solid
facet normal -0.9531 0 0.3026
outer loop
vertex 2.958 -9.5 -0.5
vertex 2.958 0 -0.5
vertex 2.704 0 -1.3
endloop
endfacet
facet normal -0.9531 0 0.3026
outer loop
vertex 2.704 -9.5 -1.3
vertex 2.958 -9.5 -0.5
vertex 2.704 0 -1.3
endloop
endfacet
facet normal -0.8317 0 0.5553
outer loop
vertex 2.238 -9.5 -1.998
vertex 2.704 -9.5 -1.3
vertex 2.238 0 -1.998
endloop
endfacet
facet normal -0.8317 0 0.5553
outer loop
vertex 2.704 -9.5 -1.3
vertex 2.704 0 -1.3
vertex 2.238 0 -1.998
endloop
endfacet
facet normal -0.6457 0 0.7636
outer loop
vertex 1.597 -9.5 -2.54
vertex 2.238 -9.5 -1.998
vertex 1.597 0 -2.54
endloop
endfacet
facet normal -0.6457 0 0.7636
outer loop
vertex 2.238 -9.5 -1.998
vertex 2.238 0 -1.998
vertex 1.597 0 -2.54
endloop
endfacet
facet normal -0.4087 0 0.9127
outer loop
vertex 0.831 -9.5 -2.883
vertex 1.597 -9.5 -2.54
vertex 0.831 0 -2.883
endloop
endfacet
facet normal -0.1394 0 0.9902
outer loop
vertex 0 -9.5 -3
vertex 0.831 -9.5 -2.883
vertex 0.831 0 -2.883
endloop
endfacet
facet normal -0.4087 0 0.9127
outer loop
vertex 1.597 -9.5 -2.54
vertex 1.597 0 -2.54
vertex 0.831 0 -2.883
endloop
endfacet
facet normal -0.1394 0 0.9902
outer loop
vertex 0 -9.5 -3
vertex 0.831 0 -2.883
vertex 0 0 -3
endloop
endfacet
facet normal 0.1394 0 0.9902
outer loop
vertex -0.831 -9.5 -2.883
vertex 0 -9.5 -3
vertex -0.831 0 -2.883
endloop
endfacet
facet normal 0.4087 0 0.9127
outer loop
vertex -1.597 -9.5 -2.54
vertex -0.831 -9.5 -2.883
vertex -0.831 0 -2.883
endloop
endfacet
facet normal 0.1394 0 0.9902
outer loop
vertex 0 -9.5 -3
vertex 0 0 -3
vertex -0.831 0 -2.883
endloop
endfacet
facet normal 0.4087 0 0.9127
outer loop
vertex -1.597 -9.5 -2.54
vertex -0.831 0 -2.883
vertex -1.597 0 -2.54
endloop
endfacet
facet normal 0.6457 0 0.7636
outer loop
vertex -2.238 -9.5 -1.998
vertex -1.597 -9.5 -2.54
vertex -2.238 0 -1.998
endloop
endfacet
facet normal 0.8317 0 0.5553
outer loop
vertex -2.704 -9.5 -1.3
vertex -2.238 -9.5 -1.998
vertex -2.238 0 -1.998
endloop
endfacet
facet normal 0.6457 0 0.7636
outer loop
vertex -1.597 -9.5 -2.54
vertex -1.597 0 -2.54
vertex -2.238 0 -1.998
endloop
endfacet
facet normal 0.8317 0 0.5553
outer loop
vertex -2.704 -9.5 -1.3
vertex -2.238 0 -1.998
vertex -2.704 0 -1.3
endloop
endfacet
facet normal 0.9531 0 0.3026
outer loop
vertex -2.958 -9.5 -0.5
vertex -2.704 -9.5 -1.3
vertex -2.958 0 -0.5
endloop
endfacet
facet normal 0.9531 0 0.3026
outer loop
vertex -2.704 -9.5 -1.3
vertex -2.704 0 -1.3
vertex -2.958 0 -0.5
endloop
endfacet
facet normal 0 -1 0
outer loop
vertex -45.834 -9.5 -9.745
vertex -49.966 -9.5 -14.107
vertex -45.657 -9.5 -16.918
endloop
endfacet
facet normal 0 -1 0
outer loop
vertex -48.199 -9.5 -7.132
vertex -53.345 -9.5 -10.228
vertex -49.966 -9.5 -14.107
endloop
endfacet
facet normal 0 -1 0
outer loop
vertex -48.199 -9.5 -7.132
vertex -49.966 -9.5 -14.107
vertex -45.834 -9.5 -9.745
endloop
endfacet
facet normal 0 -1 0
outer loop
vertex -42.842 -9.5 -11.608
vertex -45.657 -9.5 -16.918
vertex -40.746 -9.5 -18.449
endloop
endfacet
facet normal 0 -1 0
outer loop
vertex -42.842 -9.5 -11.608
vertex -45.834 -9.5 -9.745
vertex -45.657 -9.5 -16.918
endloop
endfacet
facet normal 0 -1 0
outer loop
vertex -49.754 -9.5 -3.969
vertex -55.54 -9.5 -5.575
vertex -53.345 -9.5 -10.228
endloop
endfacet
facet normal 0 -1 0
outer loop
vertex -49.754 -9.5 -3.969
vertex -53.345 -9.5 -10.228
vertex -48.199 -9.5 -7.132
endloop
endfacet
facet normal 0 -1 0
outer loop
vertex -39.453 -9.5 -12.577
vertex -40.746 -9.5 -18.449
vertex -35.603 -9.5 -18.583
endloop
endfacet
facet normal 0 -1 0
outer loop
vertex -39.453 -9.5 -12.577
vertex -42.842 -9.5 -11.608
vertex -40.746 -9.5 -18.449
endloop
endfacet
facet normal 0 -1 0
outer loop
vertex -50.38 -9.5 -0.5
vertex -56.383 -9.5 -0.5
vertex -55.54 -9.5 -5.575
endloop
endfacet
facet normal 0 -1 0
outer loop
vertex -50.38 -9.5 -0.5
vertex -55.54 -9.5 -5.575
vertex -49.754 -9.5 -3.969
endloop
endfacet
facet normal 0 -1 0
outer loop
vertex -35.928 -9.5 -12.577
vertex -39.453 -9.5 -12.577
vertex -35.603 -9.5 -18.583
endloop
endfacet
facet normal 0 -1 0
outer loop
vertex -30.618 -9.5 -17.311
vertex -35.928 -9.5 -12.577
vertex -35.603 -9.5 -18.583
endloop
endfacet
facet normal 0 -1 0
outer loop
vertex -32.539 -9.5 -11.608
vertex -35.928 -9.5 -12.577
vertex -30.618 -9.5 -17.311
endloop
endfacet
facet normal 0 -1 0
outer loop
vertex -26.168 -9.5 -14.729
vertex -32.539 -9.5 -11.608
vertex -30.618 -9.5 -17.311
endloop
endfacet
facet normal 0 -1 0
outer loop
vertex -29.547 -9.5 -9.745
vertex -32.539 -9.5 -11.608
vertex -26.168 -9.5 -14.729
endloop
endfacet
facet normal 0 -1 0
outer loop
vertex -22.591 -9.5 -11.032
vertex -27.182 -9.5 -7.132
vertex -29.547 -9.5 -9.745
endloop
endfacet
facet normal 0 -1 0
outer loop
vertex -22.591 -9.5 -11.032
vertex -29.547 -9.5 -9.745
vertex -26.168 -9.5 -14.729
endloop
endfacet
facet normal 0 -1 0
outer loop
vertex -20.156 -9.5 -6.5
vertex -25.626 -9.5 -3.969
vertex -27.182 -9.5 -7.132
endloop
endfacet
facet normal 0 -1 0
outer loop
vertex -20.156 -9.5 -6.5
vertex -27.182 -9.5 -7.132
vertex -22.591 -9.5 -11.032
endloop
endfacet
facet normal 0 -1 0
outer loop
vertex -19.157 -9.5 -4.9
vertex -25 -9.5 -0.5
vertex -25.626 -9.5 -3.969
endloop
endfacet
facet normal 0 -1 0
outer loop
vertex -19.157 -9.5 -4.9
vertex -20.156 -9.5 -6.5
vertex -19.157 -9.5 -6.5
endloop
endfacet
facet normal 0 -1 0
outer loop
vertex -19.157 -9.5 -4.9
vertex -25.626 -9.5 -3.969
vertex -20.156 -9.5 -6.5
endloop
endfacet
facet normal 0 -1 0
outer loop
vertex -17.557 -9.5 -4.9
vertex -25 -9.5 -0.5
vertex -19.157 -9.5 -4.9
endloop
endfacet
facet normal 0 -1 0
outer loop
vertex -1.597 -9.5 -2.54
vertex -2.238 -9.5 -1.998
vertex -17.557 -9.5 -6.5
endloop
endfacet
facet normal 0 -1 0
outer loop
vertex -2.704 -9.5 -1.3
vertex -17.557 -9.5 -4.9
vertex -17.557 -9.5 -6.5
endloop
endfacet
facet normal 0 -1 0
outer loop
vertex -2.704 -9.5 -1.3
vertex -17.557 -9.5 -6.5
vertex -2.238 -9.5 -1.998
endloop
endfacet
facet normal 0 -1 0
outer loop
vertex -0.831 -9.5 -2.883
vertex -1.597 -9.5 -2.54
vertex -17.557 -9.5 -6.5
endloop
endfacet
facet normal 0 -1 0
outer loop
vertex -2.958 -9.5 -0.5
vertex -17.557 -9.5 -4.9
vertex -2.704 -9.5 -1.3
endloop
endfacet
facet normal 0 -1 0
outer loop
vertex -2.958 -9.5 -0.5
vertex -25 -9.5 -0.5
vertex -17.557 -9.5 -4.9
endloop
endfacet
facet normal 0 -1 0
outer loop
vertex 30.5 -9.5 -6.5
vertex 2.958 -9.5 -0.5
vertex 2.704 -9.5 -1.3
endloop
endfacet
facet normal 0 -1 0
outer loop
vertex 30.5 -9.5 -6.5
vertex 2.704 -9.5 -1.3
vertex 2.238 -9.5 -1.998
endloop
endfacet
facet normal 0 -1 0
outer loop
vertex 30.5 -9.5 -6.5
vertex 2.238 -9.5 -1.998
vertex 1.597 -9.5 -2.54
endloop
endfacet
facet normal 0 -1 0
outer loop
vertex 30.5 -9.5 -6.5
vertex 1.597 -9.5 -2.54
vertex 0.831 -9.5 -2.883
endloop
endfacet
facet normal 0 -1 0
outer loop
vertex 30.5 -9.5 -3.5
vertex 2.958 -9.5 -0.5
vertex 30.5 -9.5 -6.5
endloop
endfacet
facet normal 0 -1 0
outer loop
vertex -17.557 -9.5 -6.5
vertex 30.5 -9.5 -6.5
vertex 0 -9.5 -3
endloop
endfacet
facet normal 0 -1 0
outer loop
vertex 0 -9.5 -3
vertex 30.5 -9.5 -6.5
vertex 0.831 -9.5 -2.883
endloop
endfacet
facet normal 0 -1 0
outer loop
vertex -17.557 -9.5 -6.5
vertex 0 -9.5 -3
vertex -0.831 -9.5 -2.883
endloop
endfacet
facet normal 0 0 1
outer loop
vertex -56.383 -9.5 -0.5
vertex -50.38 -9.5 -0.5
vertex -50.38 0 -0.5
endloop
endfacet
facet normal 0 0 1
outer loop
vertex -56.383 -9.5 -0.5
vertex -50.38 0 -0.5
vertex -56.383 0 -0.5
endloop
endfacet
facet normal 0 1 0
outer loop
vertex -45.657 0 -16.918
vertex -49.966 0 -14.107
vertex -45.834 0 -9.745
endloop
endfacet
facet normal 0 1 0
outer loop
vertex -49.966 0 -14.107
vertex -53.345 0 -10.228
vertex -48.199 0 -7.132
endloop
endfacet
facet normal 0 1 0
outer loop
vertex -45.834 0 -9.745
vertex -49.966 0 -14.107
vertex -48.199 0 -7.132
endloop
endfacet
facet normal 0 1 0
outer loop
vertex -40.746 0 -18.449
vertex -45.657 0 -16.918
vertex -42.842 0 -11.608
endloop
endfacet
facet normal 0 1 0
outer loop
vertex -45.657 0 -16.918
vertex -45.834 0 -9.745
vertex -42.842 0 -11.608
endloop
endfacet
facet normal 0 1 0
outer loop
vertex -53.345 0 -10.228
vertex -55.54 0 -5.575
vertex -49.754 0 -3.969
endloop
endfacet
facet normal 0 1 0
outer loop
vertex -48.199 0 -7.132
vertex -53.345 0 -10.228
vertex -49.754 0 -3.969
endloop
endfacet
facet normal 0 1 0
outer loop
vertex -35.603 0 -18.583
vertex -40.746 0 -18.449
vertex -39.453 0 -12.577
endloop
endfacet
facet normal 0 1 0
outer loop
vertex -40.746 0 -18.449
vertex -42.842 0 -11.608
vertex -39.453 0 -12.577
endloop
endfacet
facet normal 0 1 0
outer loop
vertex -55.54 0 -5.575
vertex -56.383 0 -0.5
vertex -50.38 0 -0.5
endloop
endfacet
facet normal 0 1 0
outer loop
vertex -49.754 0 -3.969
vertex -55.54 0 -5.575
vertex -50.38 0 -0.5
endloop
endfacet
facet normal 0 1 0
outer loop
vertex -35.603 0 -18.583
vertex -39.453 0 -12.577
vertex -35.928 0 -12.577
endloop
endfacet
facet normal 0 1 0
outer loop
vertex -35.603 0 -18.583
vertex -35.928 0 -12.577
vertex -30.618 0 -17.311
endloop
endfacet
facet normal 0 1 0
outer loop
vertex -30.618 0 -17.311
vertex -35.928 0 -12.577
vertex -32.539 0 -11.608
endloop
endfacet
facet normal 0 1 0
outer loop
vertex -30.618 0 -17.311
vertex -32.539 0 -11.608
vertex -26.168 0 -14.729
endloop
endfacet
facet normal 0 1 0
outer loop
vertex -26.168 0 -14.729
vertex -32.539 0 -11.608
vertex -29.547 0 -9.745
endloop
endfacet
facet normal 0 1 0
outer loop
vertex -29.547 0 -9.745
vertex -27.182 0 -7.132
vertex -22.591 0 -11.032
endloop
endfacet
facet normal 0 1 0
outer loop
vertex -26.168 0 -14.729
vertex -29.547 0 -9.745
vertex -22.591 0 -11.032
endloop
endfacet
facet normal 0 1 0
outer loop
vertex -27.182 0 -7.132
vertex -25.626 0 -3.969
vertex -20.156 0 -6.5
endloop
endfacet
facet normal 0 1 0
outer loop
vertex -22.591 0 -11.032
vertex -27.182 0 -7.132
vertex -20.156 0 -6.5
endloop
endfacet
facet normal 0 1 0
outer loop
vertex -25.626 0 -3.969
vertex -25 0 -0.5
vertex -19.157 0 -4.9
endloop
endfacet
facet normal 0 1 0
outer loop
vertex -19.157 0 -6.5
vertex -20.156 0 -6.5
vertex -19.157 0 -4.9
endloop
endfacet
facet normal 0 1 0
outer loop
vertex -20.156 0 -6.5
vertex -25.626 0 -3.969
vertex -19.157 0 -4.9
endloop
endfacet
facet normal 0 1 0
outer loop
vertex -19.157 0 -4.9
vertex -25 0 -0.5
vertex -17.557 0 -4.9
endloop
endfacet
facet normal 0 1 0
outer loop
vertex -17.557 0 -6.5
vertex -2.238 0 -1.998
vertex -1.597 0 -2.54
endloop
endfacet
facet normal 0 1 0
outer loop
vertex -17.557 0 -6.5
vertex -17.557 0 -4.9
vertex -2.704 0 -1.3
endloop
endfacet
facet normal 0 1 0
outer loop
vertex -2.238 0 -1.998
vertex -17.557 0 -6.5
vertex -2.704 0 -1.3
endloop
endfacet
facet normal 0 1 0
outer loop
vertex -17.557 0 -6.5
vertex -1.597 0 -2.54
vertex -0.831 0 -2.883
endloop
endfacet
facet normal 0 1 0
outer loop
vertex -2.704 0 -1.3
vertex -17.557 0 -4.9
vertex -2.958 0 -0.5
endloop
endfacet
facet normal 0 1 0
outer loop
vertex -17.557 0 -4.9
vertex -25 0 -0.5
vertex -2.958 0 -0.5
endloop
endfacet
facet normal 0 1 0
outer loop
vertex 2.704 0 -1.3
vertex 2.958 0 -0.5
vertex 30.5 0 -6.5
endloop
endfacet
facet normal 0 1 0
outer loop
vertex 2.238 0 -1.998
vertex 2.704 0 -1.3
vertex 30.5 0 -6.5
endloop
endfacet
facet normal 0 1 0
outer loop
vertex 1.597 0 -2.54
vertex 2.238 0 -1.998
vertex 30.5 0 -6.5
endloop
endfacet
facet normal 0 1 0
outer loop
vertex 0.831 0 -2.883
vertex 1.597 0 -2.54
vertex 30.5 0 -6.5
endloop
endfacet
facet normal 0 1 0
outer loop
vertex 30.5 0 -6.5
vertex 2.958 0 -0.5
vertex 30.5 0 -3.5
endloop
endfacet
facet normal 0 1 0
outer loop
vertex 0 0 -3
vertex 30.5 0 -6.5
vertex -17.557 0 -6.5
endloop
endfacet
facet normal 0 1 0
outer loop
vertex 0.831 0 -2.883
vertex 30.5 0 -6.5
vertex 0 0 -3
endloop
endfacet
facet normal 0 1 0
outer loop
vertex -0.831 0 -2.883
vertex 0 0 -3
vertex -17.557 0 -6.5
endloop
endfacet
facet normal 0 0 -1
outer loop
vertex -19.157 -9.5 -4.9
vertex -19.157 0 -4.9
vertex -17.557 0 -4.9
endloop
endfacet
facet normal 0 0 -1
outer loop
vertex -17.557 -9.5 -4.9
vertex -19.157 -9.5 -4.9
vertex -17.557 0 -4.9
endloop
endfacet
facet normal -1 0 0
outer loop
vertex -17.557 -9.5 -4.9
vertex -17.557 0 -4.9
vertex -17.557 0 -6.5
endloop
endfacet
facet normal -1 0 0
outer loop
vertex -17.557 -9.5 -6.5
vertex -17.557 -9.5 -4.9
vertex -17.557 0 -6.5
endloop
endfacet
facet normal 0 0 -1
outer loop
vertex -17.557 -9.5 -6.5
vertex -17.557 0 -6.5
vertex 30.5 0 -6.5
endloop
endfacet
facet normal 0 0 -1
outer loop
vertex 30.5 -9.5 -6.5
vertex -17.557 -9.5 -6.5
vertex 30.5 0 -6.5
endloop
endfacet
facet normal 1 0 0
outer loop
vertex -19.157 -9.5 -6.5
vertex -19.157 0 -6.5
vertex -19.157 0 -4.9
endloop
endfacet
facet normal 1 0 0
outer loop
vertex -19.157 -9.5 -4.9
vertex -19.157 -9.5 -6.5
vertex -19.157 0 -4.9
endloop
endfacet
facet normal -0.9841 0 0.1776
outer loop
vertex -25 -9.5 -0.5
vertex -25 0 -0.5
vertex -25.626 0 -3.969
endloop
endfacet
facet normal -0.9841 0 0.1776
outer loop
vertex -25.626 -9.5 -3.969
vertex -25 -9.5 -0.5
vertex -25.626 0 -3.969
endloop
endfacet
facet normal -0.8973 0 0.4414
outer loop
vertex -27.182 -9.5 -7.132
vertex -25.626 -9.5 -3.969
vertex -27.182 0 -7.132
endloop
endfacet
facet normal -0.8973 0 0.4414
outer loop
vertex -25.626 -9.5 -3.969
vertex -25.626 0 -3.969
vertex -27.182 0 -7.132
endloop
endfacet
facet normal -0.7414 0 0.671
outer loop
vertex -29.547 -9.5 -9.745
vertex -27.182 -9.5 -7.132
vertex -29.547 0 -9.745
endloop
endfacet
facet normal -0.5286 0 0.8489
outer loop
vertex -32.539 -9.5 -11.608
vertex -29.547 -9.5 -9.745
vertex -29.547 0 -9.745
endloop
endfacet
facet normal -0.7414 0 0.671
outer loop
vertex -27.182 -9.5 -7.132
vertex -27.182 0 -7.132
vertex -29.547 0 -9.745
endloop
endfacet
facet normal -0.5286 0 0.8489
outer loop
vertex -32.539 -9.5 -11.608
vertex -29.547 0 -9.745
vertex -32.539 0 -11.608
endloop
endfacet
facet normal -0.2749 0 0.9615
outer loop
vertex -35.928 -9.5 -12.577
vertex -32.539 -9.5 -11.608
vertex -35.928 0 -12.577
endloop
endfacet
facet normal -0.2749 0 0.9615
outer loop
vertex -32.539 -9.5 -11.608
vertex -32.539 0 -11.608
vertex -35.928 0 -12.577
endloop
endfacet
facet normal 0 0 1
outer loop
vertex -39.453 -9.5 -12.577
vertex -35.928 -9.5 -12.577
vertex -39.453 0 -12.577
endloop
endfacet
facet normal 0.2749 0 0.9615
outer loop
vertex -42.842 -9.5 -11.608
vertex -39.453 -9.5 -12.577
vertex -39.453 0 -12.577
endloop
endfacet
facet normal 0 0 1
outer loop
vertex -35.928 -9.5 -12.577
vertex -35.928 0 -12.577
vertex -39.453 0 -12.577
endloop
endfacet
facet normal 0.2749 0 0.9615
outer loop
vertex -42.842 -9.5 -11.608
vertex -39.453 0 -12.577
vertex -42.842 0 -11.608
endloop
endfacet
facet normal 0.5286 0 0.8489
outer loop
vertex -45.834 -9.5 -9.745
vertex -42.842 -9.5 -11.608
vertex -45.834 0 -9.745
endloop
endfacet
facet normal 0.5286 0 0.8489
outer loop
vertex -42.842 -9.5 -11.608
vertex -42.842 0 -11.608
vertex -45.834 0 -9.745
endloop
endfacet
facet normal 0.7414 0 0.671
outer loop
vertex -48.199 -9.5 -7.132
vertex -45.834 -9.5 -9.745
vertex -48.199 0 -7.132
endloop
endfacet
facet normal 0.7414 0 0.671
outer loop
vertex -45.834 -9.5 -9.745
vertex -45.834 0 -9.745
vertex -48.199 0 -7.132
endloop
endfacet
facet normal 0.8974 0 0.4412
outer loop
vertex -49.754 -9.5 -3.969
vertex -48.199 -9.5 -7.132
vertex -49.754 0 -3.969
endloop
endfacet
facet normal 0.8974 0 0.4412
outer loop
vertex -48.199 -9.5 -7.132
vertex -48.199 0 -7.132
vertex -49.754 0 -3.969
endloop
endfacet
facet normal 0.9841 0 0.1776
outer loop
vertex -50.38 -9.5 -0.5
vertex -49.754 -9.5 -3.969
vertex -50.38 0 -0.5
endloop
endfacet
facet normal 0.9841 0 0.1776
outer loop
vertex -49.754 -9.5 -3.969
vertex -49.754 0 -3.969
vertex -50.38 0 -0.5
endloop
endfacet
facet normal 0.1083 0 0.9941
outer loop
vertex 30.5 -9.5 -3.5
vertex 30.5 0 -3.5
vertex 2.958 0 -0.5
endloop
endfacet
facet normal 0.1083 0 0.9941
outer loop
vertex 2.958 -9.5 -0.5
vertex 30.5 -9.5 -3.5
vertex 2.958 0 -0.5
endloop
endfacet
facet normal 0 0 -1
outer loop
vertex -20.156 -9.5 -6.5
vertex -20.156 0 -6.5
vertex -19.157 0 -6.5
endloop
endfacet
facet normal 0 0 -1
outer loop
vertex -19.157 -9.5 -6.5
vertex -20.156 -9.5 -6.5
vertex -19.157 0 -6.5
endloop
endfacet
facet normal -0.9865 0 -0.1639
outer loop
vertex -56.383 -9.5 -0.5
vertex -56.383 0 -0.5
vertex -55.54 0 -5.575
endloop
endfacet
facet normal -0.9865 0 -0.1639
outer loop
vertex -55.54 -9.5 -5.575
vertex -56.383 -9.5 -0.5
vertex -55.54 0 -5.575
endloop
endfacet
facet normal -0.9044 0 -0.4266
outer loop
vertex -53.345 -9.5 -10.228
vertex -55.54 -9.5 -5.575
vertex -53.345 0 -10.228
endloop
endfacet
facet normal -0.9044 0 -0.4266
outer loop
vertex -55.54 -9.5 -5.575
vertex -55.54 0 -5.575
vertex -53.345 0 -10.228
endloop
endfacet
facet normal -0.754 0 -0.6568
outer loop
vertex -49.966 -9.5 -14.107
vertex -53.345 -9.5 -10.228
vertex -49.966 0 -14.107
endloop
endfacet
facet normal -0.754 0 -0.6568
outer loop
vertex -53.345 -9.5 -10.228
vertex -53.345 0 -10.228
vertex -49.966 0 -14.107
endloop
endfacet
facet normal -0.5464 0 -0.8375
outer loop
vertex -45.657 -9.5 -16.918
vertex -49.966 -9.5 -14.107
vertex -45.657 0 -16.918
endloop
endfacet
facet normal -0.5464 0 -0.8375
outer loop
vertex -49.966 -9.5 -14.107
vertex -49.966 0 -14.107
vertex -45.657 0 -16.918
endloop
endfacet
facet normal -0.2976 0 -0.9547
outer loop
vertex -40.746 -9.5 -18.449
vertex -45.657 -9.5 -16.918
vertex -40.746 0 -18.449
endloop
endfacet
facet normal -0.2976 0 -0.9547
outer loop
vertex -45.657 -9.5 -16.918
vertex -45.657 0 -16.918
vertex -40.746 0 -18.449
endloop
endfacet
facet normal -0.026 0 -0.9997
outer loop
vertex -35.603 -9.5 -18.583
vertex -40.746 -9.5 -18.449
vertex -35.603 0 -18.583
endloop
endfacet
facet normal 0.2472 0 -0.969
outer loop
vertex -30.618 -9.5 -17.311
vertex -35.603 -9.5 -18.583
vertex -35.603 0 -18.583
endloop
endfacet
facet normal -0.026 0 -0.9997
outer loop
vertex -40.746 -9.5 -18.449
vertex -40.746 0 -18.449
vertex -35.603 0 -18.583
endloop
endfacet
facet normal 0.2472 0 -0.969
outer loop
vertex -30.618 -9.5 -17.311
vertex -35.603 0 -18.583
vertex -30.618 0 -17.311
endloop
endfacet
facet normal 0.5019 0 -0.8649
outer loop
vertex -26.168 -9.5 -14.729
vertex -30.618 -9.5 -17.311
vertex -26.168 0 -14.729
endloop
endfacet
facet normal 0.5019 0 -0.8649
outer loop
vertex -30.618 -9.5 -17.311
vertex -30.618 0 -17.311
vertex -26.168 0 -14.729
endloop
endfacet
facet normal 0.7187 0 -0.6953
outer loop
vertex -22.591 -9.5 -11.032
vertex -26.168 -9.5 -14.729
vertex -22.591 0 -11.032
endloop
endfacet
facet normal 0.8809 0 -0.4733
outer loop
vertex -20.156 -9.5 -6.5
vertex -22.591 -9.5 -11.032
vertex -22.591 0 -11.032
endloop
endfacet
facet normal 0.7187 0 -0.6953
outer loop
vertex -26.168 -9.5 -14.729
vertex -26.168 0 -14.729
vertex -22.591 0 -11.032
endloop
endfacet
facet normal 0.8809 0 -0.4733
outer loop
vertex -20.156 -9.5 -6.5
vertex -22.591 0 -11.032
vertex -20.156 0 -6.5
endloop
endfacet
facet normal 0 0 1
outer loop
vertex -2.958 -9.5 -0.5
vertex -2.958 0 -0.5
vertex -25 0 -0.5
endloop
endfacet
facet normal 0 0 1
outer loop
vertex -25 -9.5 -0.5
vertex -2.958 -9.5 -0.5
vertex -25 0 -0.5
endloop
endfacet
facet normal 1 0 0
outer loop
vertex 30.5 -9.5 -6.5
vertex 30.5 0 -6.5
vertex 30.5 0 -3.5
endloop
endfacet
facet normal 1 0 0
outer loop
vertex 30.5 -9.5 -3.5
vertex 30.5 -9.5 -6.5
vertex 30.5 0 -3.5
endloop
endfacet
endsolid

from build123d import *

# Parameters (mm, degrees)
F2_DEPTH = 9.5


with BuildPart() as f2:
    # F1 (on Front) → F2 (new body)
    with BuildSketch(Plane.XZ):
        with BuildLine():
            Line((-17.5572873813, -6.5), (30.5, -6.5))
            Line((30.5, -6.5), (30.5, -3.5))
            Line((30.5, -3.5), (2.9580398915, -0.5))
            ThreePointArc((2.9580398915, -0.5), (0, -3), (-2.9580398915, -0.5))
            Line((-2.9580398915, -0.5), (-17.160677935, -0.5))
            Line((-17.160677935, -0.5), (-17.1837798887, -0.5))
            Line((-17.1837798887, -0.5), (-25, -0.5))
            ThreePointArc((-25, -0.5), (-37.6901536634, -12.7), (-50.3803073267, -0.5))
            Line((-50.3803073267, -0.5), (-56.3834679762, -0.5))
            ThreePointArc((-56.3834679762, -0.5), (-40.745644054, -18.4486850066), (-20.1561866279, -6.5))
            Line((-20.1561866279, -6.5), (-19.1572873813, -6.5))
            Line((-19.1572873813, -6.5), (-19.1572873813, -4.9))
            Line((-19.1572873813, -4.9), (-17.5572873813, -4.9))
            Line((-17.5572873813, -4.9), (-17.5572873813, -6.5))
        make_face()
    extrude(amount=F2_DEPTH)


solid = f2.part
